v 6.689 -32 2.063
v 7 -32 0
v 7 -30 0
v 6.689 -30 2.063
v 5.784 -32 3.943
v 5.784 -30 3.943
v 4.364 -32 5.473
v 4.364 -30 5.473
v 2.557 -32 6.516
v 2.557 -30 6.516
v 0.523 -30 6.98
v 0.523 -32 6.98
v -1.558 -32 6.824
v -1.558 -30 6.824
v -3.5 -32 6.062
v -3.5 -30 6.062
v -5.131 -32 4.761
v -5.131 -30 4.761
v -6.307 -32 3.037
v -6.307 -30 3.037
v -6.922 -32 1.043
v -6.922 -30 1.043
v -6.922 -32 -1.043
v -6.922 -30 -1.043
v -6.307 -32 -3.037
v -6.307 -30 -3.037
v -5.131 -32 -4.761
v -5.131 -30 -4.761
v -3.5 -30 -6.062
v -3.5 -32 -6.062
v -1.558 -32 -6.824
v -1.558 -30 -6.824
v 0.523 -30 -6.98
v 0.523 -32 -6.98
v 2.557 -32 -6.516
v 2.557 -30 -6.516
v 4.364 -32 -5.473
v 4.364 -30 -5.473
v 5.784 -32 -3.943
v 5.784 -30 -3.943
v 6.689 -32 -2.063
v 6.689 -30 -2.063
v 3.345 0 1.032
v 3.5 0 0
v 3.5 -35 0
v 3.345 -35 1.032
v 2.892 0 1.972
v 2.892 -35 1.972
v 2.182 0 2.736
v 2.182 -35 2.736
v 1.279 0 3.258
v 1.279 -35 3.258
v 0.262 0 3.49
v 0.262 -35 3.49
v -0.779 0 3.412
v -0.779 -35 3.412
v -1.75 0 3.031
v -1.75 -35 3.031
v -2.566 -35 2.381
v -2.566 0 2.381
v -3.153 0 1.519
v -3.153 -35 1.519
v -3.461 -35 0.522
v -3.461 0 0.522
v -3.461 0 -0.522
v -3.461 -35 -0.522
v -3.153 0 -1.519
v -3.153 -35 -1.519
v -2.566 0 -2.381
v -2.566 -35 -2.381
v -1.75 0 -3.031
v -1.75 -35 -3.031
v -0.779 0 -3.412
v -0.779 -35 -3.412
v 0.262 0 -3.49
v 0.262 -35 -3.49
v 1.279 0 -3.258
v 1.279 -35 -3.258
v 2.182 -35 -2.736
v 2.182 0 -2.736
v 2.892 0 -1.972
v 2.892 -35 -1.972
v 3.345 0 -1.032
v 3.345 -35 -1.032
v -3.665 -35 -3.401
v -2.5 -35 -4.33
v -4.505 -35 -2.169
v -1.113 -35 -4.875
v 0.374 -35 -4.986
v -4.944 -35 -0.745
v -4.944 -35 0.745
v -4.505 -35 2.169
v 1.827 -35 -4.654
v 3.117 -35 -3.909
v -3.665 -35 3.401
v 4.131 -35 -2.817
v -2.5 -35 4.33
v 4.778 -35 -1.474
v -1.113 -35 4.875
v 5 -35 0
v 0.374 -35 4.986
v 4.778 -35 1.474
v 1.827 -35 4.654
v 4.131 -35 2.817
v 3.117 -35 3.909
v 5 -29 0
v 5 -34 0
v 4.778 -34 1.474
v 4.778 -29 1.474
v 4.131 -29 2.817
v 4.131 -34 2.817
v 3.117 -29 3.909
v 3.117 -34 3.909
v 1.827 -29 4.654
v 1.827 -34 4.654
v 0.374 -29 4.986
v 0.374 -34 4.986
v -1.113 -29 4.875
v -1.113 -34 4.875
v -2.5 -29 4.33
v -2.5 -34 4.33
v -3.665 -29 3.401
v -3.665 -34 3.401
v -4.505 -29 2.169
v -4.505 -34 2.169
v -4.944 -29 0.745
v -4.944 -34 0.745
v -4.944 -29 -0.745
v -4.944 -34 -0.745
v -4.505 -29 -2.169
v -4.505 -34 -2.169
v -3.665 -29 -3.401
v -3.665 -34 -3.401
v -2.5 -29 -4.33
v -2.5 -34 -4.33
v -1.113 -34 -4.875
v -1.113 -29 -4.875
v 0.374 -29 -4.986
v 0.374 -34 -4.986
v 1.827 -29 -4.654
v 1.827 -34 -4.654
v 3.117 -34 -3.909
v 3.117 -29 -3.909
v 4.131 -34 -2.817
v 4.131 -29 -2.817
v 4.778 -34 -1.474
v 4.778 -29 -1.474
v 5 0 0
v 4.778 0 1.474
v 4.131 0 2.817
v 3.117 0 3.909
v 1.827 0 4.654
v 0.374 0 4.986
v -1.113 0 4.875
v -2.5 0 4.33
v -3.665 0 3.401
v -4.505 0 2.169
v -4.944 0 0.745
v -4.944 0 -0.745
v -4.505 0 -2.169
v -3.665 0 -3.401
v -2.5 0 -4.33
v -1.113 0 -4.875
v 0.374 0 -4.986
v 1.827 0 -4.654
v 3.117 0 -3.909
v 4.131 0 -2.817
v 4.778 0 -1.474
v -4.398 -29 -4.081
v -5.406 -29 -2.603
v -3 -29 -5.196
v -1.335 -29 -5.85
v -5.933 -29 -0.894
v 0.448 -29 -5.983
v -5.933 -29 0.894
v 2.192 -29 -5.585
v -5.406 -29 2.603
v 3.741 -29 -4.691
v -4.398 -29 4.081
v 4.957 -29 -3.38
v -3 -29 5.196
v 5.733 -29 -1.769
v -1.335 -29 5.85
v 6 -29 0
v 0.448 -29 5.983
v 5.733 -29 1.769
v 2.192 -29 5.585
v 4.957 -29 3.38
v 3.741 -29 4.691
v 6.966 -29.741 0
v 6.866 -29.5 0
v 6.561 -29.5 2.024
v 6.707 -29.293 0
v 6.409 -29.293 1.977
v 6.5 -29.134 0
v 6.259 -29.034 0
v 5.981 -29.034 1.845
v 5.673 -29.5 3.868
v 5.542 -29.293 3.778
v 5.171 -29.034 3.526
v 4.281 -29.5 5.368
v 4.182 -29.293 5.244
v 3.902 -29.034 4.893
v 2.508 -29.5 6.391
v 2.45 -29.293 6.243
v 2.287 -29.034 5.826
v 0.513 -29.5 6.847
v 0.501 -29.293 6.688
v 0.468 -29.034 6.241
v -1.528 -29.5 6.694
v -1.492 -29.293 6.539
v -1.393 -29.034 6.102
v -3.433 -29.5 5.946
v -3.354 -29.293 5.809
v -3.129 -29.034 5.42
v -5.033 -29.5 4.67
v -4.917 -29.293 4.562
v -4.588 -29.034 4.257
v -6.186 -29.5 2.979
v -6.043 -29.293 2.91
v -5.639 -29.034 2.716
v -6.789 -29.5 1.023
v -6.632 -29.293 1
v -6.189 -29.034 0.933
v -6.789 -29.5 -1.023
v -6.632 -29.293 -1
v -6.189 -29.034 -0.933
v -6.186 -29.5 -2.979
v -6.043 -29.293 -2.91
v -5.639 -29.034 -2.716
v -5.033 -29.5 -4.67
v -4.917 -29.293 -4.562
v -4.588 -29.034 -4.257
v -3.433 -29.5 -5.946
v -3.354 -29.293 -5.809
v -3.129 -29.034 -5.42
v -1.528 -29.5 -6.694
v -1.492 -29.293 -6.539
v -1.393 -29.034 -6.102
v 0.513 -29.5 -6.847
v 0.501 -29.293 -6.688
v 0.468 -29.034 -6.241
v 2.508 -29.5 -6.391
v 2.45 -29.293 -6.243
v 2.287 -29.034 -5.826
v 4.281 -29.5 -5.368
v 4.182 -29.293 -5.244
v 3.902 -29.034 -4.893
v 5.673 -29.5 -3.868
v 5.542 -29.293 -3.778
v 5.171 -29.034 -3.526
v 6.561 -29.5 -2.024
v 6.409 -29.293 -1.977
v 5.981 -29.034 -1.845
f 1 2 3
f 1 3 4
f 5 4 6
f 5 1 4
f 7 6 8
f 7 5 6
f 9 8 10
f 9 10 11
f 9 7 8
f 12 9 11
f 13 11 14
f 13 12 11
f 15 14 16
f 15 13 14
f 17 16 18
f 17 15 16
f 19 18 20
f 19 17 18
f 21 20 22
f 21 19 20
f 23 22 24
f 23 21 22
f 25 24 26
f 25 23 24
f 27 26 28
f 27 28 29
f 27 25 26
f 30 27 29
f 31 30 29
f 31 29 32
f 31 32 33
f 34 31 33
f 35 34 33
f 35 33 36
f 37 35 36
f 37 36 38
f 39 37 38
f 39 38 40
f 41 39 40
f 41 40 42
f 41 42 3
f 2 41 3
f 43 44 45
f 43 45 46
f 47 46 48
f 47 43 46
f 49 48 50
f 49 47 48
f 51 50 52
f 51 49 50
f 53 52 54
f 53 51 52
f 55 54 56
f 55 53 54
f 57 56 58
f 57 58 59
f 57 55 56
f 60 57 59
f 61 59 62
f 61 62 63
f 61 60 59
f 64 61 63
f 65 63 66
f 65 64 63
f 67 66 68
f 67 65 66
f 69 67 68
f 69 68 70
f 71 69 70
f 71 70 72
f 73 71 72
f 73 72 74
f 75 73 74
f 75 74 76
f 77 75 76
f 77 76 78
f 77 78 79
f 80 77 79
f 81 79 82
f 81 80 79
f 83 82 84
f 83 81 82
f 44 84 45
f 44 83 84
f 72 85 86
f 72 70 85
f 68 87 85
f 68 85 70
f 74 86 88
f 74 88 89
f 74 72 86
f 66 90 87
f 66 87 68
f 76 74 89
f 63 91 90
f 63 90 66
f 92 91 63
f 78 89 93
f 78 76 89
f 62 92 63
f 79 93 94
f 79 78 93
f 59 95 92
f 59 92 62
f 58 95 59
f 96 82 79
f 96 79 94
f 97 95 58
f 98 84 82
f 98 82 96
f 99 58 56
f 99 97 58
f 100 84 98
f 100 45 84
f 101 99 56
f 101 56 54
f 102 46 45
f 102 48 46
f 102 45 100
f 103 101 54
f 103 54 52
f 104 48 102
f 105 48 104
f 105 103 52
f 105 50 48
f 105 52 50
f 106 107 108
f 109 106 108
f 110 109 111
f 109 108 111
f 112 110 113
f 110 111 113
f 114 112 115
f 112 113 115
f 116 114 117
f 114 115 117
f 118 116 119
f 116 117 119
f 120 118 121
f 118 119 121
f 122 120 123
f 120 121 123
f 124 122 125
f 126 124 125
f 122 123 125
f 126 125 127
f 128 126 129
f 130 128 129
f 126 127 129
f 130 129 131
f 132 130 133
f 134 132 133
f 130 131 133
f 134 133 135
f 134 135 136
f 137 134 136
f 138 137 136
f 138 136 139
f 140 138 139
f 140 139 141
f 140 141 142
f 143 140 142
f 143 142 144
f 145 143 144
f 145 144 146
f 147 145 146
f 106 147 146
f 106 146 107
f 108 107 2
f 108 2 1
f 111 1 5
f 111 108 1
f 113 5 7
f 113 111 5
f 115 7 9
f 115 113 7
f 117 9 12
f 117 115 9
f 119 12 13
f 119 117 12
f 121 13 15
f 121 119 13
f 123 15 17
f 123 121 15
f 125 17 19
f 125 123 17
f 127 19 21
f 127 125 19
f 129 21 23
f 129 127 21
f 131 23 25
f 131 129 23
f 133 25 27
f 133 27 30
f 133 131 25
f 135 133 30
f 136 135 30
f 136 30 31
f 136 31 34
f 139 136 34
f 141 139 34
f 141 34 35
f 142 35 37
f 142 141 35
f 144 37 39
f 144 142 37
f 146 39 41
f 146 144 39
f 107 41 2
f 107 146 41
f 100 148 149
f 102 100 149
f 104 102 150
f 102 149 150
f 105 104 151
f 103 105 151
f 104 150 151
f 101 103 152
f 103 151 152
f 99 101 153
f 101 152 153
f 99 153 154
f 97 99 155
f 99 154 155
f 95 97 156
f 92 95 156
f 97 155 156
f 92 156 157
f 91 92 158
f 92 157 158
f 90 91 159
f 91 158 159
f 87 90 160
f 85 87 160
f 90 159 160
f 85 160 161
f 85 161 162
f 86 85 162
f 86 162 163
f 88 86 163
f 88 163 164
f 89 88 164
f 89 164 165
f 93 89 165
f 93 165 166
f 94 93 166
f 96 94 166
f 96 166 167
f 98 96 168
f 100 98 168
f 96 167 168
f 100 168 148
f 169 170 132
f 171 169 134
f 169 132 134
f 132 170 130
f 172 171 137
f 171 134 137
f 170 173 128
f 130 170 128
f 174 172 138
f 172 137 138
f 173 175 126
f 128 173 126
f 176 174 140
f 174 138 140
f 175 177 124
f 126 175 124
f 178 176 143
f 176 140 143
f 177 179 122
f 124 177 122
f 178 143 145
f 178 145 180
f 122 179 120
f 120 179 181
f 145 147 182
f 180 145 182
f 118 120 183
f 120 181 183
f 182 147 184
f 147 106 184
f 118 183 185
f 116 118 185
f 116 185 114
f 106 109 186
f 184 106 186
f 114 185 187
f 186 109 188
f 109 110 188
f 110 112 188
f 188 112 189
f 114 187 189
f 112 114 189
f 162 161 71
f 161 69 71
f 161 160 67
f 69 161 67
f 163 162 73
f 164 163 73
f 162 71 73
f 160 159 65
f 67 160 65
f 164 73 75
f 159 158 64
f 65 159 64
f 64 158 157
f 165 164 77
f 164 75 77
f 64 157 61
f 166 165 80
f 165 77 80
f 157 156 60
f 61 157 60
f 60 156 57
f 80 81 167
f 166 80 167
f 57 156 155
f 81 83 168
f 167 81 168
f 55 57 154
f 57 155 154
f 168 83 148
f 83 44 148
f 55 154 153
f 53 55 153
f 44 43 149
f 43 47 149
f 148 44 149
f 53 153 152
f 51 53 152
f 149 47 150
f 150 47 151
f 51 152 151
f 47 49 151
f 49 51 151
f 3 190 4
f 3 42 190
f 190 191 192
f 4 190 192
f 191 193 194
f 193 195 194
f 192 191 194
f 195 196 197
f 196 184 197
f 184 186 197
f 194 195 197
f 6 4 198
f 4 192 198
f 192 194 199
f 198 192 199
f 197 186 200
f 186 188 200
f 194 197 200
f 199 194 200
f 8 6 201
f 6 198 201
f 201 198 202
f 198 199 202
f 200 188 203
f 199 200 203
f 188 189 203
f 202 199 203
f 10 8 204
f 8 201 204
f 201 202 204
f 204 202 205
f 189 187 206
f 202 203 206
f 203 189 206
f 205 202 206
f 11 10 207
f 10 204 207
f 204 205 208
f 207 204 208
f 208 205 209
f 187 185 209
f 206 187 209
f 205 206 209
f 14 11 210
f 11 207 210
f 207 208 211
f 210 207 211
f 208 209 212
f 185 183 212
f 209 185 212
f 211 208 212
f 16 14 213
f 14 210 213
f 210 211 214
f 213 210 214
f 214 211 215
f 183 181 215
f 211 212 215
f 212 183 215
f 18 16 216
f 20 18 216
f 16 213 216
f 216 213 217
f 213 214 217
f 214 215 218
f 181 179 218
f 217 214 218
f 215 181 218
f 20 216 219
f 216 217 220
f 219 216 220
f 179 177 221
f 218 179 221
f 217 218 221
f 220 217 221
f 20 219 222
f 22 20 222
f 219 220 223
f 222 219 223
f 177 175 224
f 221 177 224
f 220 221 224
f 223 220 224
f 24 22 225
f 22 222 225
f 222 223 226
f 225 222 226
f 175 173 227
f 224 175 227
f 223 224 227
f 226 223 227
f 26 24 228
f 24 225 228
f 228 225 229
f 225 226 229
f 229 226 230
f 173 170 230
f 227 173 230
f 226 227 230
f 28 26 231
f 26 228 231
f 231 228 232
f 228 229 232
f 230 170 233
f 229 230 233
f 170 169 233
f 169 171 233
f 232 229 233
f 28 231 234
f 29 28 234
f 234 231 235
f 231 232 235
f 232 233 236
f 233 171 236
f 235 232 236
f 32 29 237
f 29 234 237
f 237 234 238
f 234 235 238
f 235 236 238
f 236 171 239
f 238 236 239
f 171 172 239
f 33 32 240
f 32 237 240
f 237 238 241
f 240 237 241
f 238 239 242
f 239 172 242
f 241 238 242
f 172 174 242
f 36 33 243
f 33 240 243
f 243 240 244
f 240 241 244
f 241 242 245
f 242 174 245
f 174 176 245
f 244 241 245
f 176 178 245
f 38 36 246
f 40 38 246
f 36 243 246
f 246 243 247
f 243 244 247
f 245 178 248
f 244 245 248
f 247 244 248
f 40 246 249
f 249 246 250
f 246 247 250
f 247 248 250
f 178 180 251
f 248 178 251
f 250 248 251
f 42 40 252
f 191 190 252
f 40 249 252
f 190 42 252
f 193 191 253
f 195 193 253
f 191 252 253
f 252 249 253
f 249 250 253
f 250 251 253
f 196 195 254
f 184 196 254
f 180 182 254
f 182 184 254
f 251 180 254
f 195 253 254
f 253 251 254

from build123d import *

# Parameters (mm, degrees)
F0_R     = 5
F0_R_2   = 3.5
F1_DEPTH = 35
F2_R     = 7
F2_R_2   = 5
F3_DEPTH = 6
F5_R     = 1


# Not quite as in the source:
# - a fillet or chamfer that OpenCascade refuses, or shapes differently, is made with other operations: its cross-section is extruded or revolved along the edge and cut away or added


with BuildPart() as f1:
    # F0 (on Front) → F1 (new body)
    with BuildSketch(Plane.XZ):
        Circle(F0_R)
        Circle(F0_R_2, mode=Mode.SUBTRACT)
    extrude(amount=F1_DEPTH)


with BuildPart() as f3:
    # F2 (on face) → F3 (new body)
    with BuildSketch(Plane.XZ.offset(35)):
        Circle(F2_R)
        Circle(F2_R_2, mode=Mode.SUBTRACT)
    extrude(amount=-F3_DEPTH)

    # F4: chamfer of 3 on 1 edges, made by hand

    # F4_s1 → F4_t2 (revolve, cut)
    with BuildSketch(Plane.XY):
        Polygon((7, -32), (4, -35), (7, -35), align=None)
    revolve(axis=Axis((0, -35, 0), (0, -1, 0)), mode=Mode.SUBTRACT)

    # F5
    f5_edges = [f3.edges().sort_by_distance(p)[0] for p in [
        (-7, -29, 0),
    ]]
    fillet(f5_edges, radius=F5_R)


solid = Compound([f1.part, f3.part])
